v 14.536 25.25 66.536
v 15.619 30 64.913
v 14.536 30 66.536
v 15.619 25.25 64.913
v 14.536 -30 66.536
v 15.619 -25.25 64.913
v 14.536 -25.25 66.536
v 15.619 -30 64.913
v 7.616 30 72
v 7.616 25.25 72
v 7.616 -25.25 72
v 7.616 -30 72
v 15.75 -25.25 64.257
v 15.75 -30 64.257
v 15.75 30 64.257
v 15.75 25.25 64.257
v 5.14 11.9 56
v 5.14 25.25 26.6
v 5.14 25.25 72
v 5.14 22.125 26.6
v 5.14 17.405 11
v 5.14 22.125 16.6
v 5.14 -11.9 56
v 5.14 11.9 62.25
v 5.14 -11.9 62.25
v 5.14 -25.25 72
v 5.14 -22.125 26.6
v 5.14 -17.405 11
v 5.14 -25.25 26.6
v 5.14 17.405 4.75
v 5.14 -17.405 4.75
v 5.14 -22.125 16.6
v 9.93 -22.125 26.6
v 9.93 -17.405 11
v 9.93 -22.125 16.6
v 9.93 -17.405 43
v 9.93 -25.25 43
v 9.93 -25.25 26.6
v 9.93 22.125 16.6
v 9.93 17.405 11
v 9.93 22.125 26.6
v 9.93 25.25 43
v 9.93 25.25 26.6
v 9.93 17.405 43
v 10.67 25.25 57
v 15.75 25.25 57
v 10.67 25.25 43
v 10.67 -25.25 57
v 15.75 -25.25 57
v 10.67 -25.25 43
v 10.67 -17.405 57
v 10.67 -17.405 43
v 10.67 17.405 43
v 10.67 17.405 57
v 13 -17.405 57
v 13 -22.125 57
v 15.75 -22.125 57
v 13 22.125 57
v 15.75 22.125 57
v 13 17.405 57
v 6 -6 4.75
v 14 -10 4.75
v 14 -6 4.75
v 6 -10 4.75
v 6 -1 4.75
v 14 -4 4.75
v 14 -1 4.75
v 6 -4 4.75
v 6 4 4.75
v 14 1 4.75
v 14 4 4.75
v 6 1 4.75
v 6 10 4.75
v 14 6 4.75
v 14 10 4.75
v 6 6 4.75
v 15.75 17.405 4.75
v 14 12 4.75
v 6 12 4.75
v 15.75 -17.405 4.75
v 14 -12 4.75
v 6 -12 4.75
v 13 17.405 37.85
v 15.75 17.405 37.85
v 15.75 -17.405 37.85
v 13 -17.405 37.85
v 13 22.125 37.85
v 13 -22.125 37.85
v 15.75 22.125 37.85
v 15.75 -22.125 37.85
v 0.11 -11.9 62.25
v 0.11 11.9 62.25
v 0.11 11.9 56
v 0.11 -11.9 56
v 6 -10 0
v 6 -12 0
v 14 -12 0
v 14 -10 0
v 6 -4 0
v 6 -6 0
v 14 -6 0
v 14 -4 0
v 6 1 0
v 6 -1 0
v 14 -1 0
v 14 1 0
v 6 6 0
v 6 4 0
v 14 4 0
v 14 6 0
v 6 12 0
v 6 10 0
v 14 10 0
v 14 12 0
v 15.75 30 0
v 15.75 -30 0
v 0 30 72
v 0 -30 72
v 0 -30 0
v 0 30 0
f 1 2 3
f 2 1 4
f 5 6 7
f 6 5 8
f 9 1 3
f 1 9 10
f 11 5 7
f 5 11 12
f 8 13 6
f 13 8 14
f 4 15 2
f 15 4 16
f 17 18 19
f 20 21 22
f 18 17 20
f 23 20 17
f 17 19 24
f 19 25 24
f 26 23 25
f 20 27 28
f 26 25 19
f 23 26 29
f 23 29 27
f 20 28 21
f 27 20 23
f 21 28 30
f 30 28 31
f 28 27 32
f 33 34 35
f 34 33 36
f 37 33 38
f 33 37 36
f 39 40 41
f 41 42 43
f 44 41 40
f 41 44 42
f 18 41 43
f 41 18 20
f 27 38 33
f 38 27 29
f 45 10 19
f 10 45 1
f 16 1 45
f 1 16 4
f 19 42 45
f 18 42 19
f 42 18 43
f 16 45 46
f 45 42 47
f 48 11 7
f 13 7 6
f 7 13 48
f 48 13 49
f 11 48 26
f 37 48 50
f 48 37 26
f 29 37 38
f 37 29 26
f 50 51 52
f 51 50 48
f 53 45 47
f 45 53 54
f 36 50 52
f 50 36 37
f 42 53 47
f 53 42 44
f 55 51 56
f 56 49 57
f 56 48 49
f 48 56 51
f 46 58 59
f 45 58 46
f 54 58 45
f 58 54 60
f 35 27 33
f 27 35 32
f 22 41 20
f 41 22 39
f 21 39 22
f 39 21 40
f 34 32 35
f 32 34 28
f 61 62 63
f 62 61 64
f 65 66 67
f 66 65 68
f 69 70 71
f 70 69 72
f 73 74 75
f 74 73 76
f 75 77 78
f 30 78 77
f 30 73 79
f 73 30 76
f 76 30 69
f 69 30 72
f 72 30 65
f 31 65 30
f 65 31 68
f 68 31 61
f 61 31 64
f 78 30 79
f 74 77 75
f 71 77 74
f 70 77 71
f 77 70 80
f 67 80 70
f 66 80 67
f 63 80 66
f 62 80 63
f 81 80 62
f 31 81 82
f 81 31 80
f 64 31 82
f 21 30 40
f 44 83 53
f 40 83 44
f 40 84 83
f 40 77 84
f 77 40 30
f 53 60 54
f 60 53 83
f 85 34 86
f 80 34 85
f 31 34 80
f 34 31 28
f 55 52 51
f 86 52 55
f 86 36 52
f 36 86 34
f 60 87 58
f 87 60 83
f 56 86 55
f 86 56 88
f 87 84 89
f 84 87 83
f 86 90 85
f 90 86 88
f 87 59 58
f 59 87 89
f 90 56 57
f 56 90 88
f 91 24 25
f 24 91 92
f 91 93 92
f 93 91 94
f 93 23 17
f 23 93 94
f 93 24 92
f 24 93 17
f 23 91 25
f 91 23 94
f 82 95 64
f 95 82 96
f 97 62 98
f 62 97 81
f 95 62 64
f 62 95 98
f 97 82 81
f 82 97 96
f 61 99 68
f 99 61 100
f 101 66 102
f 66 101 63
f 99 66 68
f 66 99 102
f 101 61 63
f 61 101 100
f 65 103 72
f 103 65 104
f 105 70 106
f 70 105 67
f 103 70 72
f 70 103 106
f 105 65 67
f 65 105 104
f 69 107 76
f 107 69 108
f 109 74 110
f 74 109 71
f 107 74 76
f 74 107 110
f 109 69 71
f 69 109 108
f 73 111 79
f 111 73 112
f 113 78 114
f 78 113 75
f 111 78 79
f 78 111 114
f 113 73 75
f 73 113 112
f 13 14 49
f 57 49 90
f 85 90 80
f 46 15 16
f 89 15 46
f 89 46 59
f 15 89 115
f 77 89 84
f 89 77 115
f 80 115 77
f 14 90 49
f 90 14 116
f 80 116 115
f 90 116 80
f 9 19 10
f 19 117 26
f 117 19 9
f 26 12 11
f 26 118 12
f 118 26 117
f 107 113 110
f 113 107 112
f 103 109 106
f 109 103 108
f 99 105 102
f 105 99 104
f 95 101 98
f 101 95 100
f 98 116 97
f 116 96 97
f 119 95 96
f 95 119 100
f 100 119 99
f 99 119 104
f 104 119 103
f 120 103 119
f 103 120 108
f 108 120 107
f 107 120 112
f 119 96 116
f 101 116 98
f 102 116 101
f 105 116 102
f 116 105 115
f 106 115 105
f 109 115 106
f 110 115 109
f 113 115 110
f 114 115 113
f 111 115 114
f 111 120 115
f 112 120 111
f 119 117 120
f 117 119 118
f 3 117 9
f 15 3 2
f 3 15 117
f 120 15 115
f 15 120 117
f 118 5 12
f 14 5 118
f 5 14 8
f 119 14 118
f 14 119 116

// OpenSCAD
/* X-origin is battery terminals, battery front facing positive-X
 */
 
module Dewalt20vBatteryTerminals(clearance=0.25, extend=10) {
  terminalWidth = 2;
  
  // Terminals
  for (Y = [-11,-5,0,5,11]) translate([-extend,Y-(terminalWidth/2),2])
  cube([10+extend,terminalWidth, 8]);
}

module Dewalt20vBatteryCutter(clearance=0.25) {


  clear = clearance;
  clear2 = clear*2;
  
  // Widest T-section
  translate([21.6,-25-clear,6.32-clear])
  cube([46.4, 50+clear2, 4.29+clear2]);
  
  // Widest T-section, thickened
  translate([38, -25-clear,5.33])
  cube([30, 50+clear2, 5.28]);
  
  // Front stop
  translate([52, -25-clear,0])
  cube([16, 50+clear2, 10.61+clear]);
  
  hull() {
    
    // Middle-width T-section
    translate([11.6,-(43.75/2)-clear,6.32-clear])
    cube([11.15, 43.75+clear2, 4.29+clear2]);
    
    // Taper towards Battery Terminal Block
    translate([6,-(34.31/2)-clear,6.32-clear])
    cube([60, 34.31+clear2, 4.29+clear2]);
  }
  
  // Battery Terminal Block
  translate([-clear,-(34.31/2)-clear,0])
  cube([66+clear2, 34.31+clear2, 10.61+clear]);
  
  // First set of inclines
  translate([32.85, -(43.75/2)-clear,0])
  cube([30, 43.75+clear2, 3]);
  
  // Latch
  translate([51,-(23.3/2)-clear,10.6])
  cube([6.25, 23.3+clear2, 5.04+clear]);
  
  // Front body
  difference() {
  
    // Front Body
    translate([58, -31,0])
    cube([10, 62, 10.61+clear]);
    
    hull() {
      
      // Front body side curve
      translate([58,0,5])
      rotate([90,0,0])
      cylinder(r=5, h=60+4, center=true);
      
      // Front body side edge
      translate([58, -32, 0])
      rotate([0,-45,0])
      cube([16, 64, 10]);
    }
  }
  
  // Battery pack body mockup
  translate([-14.75,-30,-29])
  cube([114, 60, 29]);
}

module Dewalt20vBatteryAdapter() {
  difference() {
    translate([0,-30,0])
    cube([15.75, 60, 72]);
    
    translate([16,0,5])
    rotate([0,-90,0]) {
      Dewalt20vBatteryCutter(); 
      #Dewalt20vBatteryTerminals();
    }
  }
}

Dewalt20vBatteryAdapter();
